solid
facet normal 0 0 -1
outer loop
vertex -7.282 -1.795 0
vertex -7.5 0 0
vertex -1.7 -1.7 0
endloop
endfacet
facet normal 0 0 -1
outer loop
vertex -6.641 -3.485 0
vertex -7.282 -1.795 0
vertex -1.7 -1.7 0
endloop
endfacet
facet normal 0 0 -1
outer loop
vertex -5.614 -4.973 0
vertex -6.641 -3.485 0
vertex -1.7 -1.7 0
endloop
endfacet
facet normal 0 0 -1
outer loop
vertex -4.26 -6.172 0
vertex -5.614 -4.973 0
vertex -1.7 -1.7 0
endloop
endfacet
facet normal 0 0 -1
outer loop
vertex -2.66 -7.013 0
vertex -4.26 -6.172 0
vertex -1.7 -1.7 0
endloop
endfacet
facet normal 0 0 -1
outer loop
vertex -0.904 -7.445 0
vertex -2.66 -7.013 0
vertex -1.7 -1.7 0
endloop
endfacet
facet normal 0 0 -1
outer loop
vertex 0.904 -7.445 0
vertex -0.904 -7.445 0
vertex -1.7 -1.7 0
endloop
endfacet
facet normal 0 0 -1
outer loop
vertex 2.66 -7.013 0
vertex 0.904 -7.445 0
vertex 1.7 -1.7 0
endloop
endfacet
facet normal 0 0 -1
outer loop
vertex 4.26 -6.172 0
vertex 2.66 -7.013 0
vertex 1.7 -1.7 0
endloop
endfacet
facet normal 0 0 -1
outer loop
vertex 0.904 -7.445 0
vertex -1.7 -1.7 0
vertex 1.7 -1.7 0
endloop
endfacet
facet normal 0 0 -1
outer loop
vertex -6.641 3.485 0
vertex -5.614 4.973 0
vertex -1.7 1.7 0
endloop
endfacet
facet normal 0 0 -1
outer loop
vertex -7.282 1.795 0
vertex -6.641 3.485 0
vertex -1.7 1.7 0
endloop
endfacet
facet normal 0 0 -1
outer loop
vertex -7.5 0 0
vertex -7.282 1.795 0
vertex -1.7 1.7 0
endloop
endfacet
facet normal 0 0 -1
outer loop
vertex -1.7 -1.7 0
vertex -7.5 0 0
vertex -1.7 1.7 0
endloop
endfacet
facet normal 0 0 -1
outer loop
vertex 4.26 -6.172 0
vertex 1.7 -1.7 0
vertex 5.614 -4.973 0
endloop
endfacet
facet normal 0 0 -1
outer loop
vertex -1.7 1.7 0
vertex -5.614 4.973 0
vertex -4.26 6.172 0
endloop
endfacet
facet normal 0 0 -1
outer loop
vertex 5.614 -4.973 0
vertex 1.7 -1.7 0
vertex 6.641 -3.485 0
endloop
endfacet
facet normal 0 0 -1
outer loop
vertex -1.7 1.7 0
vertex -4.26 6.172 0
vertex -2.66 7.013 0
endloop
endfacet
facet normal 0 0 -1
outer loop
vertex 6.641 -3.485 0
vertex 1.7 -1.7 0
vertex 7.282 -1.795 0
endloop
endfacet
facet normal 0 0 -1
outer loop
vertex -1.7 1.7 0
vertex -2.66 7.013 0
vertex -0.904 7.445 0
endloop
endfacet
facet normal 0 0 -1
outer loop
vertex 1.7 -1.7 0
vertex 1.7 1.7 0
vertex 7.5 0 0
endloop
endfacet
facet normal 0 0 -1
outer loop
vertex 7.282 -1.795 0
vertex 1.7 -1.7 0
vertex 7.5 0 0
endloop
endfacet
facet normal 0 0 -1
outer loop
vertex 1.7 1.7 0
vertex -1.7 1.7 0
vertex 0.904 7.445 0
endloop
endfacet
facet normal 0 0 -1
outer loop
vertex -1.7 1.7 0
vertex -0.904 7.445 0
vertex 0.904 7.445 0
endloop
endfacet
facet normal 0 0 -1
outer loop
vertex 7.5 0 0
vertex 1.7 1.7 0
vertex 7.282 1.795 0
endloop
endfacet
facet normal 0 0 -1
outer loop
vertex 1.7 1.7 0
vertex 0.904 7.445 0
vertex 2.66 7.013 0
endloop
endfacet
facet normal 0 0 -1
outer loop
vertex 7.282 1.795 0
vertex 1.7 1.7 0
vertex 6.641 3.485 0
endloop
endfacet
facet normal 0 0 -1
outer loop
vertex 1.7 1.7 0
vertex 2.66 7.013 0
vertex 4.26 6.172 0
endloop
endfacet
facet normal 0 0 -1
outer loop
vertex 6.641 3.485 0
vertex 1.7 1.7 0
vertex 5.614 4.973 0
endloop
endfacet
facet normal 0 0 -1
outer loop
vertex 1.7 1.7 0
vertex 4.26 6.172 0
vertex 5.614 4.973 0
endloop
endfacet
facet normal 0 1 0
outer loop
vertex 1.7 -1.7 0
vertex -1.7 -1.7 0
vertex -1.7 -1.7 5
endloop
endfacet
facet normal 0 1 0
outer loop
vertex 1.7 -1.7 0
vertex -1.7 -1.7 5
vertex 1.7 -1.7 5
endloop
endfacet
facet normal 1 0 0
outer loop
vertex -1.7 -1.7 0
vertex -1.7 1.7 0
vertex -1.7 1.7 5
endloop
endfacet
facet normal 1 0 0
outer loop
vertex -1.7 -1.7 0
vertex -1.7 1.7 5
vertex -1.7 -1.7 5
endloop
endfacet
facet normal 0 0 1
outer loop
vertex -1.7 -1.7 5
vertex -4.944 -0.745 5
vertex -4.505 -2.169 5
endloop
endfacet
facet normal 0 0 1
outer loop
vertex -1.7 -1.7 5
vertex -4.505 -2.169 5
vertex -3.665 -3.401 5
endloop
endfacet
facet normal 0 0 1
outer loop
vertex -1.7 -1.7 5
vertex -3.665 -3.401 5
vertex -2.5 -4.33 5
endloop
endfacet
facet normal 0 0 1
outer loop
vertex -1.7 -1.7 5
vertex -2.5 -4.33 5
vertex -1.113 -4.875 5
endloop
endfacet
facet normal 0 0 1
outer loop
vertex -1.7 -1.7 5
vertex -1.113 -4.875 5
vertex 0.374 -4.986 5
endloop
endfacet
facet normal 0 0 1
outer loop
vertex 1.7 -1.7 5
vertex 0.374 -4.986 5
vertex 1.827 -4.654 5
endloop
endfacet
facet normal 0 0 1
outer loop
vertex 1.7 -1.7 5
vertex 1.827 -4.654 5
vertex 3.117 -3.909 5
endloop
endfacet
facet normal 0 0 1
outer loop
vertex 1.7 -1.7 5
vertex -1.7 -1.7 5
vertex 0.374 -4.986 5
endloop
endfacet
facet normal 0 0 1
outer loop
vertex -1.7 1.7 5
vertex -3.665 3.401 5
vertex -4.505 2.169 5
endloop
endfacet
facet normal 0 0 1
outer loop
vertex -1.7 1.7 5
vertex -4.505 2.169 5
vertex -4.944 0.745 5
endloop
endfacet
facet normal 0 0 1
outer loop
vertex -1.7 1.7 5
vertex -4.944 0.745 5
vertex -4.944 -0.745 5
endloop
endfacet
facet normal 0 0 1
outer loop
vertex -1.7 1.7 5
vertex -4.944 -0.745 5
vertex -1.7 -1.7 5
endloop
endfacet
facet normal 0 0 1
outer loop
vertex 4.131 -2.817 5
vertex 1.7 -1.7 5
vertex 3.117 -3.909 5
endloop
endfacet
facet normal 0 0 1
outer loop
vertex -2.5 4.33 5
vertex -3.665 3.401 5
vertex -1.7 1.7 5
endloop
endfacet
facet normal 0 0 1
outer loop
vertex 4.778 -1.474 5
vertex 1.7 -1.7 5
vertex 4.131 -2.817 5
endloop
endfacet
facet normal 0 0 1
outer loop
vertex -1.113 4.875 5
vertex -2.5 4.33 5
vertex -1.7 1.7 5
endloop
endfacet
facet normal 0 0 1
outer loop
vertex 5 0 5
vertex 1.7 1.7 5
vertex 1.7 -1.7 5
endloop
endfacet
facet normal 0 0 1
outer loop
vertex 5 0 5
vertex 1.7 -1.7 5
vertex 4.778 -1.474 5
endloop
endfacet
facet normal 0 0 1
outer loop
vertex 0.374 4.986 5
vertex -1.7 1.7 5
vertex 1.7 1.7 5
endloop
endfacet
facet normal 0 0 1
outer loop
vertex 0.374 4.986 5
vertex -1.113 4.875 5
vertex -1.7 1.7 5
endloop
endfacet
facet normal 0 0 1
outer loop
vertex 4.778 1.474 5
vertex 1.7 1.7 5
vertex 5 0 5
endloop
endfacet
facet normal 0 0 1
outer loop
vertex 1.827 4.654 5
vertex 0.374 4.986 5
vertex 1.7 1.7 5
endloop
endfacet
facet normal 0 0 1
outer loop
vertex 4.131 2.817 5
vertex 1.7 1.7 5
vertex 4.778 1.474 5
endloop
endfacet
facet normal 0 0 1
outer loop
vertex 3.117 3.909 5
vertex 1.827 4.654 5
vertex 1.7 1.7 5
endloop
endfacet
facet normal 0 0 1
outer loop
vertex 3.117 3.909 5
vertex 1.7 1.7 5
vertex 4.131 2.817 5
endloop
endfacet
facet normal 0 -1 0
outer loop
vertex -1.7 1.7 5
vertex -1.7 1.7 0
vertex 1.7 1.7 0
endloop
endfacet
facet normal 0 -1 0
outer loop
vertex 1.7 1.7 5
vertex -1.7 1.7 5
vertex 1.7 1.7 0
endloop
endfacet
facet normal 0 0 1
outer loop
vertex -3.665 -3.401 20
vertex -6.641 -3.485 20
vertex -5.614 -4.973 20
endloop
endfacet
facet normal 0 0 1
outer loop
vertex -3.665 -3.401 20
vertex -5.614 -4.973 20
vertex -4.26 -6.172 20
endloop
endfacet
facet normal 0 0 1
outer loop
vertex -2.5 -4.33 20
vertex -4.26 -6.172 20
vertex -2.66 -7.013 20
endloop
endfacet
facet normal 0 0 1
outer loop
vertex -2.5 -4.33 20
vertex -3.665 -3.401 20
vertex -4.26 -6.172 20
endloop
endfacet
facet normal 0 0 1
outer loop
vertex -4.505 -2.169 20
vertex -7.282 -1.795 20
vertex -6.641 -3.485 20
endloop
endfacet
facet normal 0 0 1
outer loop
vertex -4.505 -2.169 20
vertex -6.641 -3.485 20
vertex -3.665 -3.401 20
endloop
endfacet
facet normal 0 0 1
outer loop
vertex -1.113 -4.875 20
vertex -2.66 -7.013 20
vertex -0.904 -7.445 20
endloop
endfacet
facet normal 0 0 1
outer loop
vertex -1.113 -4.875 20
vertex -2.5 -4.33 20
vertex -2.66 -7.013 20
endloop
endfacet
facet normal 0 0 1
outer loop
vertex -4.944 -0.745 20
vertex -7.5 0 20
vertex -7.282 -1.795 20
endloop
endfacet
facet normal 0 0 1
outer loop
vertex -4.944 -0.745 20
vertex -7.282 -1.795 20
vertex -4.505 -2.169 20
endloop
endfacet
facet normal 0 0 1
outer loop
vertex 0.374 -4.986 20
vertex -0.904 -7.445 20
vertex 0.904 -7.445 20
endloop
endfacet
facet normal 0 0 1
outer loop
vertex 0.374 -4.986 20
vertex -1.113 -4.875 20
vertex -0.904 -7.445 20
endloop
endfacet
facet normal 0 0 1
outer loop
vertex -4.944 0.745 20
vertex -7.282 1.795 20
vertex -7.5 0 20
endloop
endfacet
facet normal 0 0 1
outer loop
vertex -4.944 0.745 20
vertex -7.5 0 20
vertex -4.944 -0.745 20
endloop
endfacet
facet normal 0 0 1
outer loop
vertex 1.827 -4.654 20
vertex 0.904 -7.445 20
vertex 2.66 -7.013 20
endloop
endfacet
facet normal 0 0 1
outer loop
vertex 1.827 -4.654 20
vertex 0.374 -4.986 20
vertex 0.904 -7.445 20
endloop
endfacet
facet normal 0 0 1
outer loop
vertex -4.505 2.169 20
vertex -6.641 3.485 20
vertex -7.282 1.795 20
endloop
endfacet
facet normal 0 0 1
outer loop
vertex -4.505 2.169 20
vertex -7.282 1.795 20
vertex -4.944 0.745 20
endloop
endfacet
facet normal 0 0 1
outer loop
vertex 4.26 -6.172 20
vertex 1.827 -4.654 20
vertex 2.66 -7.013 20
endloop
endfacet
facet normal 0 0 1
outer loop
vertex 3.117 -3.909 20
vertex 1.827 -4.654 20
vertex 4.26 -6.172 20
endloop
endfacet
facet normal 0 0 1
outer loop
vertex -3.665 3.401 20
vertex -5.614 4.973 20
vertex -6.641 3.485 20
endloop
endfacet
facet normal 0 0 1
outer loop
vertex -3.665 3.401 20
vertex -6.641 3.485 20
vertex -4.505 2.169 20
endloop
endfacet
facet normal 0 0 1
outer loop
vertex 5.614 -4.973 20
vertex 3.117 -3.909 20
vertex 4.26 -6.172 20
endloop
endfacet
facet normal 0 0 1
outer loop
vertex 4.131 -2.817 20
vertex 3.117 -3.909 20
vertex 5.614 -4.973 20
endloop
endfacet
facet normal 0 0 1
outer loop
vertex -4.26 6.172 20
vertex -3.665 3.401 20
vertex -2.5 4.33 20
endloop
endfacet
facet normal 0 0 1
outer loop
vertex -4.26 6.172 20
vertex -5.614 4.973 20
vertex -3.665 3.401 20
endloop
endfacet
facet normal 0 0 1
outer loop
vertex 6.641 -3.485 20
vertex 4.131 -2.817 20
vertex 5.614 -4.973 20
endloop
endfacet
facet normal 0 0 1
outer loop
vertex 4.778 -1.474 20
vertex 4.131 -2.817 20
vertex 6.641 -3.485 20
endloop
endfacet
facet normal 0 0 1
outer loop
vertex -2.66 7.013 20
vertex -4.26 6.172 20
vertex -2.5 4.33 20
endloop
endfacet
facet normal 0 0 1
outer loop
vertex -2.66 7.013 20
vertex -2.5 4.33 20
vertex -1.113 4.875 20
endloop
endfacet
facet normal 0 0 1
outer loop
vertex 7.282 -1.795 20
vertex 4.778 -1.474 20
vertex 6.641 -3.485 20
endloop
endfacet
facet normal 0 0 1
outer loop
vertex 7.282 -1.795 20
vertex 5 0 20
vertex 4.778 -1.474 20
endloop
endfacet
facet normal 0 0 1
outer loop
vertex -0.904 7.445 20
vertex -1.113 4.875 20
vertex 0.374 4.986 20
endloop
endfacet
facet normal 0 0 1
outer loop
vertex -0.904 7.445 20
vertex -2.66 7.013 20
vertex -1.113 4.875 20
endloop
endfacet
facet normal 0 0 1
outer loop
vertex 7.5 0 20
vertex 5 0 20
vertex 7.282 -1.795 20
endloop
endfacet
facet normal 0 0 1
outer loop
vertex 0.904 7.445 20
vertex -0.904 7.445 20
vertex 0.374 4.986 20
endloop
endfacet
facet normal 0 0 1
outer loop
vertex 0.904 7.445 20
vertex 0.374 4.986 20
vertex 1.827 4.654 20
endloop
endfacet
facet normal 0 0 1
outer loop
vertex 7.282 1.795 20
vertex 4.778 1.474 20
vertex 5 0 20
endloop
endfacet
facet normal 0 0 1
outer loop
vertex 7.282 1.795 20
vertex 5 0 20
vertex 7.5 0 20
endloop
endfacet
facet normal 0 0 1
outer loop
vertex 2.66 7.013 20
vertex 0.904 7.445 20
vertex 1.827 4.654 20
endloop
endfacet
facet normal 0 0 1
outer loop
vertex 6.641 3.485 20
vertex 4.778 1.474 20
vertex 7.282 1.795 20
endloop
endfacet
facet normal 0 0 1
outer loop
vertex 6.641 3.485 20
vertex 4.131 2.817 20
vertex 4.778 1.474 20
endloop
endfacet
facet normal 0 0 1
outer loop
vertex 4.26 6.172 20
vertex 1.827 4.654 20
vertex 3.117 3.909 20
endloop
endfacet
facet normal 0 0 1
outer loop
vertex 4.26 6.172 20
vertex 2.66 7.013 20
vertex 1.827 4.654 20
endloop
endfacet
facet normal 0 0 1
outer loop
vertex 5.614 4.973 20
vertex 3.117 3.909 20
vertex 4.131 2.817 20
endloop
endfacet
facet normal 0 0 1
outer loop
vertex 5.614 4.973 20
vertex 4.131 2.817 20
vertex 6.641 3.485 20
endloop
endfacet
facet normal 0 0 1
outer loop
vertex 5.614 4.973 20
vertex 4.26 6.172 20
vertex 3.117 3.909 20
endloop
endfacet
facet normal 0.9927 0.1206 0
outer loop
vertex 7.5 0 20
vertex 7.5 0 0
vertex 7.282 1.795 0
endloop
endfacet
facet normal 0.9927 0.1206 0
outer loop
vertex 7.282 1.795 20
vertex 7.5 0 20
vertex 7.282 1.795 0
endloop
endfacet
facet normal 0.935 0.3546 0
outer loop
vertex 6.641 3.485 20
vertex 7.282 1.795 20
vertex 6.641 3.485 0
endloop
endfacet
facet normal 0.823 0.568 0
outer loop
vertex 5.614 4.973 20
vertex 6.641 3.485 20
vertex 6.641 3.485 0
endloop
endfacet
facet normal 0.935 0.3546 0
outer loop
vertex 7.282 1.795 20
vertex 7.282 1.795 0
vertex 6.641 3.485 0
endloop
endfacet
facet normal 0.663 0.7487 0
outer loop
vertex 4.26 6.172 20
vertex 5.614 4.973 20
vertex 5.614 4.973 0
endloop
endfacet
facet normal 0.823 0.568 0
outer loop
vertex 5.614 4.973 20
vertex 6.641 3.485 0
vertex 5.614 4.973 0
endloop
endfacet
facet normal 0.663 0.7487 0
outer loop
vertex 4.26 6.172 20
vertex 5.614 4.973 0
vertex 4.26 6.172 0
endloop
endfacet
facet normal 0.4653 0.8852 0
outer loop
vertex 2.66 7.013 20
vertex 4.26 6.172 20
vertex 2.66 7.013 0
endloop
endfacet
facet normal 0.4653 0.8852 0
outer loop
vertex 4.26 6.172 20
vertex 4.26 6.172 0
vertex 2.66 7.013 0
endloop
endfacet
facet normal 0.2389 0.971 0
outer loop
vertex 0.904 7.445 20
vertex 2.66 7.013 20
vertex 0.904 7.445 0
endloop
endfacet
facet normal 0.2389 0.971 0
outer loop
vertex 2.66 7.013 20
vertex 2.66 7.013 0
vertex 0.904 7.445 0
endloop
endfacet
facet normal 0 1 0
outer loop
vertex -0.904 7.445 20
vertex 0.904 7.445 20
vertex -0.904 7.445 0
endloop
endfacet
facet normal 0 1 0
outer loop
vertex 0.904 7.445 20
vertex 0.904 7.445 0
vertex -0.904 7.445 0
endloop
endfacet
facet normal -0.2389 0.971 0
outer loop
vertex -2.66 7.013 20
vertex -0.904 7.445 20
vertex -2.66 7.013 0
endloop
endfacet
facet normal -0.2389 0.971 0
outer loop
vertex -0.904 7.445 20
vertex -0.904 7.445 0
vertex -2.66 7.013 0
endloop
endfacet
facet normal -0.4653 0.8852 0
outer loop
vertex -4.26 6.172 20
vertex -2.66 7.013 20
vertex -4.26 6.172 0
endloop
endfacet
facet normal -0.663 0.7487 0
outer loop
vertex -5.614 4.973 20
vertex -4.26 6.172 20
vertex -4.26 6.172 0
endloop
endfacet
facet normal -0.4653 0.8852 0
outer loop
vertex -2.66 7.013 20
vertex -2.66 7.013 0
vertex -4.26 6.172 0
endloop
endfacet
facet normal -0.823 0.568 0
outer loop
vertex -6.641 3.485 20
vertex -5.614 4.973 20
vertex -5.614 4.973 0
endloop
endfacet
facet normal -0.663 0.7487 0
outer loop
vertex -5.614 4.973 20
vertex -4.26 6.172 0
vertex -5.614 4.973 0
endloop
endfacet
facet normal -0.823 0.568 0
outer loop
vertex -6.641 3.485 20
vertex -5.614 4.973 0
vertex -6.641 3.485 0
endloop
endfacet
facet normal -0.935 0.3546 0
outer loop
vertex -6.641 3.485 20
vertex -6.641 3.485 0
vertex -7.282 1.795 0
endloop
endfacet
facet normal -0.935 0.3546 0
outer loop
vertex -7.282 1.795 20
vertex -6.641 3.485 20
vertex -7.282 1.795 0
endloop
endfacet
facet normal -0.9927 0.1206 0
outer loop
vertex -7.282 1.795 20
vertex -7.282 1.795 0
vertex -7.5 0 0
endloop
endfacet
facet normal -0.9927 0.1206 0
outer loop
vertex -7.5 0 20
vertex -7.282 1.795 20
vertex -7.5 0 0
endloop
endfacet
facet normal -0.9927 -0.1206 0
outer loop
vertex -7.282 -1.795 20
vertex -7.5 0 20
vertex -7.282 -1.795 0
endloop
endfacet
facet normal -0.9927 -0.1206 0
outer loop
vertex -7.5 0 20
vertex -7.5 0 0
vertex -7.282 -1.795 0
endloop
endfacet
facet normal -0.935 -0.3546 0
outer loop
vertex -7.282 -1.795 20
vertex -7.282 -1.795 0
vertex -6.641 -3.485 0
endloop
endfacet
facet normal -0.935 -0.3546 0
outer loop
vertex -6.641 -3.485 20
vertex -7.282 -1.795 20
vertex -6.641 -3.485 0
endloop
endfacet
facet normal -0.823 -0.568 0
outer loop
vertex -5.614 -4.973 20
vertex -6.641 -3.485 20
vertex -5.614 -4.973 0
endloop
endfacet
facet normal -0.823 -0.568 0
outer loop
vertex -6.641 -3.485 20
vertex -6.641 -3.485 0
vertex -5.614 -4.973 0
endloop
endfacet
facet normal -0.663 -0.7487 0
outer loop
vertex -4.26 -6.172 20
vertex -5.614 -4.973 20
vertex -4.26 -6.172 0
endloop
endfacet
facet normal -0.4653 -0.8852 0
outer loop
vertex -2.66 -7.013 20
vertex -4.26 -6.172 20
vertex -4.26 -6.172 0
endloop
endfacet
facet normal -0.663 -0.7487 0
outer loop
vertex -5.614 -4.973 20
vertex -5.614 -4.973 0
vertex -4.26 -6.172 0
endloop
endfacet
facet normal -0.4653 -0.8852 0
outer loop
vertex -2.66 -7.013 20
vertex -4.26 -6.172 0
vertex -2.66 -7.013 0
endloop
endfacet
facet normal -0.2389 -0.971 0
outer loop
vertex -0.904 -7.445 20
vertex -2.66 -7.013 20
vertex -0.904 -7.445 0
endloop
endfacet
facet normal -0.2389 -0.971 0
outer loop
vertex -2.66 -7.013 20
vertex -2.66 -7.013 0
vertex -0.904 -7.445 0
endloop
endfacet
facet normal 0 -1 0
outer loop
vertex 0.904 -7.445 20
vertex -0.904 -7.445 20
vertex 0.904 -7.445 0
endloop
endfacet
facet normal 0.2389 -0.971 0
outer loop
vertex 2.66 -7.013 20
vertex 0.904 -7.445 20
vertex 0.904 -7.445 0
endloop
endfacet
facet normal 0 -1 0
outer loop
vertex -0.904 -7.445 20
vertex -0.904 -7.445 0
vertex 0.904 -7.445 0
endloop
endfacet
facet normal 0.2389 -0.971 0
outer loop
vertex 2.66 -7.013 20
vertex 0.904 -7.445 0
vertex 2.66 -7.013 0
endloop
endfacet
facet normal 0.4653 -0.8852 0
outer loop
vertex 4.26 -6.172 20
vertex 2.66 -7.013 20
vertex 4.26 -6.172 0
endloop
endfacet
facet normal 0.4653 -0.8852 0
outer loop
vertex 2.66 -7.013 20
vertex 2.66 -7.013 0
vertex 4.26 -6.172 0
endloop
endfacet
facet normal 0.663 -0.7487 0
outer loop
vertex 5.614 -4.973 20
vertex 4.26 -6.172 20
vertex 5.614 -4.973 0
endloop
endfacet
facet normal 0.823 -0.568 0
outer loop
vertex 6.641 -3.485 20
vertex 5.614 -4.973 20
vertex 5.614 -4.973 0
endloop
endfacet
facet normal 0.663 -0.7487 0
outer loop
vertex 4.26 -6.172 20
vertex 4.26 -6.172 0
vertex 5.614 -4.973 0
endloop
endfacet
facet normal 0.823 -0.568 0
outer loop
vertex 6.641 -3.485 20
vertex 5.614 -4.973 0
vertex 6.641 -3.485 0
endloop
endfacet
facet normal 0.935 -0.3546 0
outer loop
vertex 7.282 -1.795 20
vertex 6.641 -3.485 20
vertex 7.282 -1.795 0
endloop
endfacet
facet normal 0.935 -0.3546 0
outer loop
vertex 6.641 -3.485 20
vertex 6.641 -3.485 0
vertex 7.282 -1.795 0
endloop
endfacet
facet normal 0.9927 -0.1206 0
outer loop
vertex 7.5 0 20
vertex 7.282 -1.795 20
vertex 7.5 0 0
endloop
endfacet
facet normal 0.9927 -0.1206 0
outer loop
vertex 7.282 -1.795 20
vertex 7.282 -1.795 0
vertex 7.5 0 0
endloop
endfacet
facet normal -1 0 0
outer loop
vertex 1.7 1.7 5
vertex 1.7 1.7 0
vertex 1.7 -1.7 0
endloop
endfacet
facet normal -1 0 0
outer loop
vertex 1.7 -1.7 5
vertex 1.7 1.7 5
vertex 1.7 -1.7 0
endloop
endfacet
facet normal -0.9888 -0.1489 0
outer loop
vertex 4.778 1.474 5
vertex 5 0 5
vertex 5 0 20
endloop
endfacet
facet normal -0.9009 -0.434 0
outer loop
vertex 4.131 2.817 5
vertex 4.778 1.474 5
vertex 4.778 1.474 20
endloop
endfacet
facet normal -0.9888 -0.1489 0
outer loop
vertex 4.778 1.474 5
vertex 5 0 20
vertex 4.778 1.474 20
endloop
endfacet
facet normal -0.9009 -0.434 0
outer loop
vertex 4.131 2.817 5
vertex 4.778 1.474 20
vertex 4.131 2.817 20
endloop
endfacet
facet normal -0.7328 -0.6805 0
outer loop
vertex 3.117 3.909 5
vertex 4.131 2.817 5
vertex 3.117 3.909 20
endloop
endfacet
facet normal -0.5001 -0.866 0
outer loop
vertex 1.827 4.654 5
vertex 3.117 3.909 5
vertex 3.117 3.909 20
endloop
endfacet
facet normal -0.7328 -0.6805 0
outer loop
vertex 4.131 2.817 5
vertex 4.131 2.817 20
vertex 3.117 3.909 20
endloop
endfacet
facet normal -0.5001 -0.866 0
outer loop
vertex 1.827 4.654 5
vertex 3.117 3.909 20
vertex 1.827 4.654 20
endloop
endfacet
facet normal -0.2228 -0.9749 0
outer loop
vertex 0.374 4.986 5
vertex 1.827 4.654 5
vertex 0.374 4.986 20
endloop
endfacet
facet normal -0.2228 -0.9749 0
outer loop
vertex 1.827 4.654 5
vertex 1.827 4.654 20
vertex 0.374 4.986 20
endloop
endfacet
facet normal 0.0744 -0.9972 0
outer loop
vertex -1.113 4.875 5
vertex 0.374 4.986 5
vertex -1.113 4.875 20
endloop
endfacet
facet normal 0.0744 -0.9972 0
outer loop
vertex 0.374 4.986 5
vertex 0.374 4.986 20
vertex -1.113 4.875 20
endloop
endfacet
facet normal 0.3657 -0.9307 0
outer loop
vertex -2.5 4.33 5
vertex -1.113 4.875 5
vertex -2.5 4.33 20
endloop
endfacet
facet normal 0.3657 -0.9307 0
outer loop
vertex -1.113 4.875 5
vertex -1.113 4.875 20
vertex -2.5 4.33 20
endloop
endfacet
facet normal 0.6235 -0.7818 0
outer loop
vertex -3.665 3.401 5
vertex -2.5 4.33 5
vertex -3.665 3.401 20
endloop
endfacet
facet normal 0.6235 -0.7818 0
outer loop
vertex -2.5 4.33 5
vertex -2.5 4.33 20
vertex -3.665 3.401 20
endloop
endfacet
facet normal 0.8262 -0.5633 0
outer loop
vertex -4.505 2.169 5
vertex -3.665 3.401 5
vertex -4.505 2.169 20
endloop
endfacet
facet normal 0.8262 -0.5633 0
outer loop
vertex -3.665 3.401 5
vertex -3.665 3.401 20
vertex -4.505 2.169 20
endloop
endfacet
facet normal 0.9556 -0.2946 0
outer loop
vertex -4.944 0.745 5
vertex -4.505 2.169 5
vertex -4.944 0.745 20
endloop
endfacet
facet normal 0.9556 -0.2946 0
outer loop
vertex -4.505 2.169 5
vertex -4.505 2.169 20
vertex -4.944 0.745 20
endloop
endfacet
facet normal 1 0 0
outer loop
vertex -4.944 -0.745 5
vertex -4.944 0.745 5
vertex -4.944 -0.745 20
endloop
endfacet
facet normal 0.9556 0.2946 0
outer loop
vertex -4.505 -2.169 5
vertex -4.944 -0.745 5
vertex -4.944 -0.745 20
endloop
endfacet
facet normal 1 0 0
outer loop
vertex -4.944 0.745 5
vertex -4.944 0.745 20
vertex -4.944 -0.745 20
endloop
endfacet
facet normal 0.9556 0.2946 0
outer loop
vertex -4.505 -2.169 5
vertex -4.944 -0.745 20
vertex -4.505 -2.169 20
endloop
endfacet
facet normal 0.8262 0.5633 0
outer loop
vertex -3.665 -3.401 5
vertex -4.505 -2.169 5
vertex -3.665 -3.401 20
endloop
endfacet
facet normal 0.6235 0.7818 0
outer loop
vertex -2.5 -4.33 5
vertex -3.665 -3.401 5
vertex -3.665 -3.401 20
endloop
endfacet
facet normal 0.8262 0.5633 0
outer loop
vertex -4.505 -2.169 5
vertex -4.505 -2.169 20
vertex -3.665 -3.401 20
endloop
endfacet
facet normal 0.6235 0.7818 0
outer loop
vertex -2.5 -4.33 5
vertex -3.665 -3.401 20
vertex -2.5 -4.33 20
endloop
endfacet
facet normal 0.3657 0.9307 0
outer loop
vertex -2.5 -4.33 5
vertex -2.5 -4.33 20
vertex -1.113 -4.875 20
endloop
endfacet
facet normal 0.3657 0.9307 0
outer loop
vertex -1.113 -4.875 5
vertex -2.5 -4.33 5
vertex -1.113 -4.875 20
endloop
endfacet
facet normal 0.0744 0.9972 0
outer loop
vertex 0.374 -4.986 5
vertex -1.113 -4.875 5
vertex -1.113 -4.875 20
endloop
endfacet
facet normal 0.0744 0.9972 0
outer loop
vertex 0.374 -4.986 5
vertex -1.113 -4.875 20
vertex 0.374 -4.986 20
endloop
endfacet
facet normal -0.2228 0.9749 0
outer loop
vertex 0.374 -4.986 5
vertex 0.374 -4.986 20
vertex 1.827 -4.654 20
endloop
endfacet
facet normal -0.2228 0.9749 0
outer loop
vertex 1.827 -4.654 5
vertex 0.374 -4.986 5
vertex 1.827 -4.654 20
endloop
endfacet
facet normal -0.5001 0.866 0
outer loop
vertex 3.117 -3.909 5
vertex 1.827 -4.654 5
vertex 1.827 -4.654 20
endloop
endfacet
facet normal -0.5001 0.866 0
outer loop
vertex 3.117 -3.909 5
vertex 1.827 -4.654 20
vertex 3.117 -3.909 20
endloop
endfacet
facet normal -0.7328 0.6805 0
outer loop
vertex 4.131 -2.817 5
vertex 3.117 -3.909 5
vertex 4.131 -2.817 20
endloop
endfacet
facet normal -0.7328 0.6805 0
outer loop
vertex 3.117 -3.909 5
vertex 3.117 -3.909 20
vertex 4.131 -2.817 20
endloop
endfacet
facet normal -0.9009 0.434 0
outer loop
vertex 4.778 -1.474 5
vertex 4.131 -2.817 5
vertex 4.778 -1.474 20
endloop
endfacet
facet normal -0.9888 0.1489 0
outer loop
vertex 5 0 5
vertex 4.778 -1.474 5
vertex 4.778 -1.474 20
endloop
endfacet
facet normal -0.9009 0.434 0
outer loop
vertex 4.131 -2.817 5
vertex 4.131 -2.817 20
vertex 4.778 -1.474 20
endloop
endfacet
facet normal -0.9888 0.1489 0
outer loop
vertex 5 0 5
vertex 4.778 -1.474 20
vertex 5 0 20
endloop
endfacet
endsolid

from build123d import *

# Parameters (mm, degrees)
F0_R     = 7.5
F1_DEPTH = 20
F2_R     = 5
F3_DEPTH = 15
F4_W     = 3.4
F4_H     = 3.4
F5_DEPTH = 10


with BuildPart() as f1:
    # F0 (on Top) → F1 (new body)
    with BuildSketch(Plane.XY):
        Circle(F0_R)
    extrude(amount=F1_DEPTH)

    # F2 (on face) → F3 (cut)
    with BuildSketch(Plane.XY.offset(20)):
        Circle(F2_R)
    extrude(amount=-F3_DEPTH, mode=Mode.SUBTRACT)

    # F4 (on face) → F5 (cut)
    with BuildSketch(Plane(origin=(0, 0, 0), x_dir=(1, 0, 0), z_dir=(0, 0, -1))):
        Rectangle(F4_W, F4_H)
    extrude(amount=-F5_DEPTH, mode=Mode.SUBTRACT)


solid = f1.part
